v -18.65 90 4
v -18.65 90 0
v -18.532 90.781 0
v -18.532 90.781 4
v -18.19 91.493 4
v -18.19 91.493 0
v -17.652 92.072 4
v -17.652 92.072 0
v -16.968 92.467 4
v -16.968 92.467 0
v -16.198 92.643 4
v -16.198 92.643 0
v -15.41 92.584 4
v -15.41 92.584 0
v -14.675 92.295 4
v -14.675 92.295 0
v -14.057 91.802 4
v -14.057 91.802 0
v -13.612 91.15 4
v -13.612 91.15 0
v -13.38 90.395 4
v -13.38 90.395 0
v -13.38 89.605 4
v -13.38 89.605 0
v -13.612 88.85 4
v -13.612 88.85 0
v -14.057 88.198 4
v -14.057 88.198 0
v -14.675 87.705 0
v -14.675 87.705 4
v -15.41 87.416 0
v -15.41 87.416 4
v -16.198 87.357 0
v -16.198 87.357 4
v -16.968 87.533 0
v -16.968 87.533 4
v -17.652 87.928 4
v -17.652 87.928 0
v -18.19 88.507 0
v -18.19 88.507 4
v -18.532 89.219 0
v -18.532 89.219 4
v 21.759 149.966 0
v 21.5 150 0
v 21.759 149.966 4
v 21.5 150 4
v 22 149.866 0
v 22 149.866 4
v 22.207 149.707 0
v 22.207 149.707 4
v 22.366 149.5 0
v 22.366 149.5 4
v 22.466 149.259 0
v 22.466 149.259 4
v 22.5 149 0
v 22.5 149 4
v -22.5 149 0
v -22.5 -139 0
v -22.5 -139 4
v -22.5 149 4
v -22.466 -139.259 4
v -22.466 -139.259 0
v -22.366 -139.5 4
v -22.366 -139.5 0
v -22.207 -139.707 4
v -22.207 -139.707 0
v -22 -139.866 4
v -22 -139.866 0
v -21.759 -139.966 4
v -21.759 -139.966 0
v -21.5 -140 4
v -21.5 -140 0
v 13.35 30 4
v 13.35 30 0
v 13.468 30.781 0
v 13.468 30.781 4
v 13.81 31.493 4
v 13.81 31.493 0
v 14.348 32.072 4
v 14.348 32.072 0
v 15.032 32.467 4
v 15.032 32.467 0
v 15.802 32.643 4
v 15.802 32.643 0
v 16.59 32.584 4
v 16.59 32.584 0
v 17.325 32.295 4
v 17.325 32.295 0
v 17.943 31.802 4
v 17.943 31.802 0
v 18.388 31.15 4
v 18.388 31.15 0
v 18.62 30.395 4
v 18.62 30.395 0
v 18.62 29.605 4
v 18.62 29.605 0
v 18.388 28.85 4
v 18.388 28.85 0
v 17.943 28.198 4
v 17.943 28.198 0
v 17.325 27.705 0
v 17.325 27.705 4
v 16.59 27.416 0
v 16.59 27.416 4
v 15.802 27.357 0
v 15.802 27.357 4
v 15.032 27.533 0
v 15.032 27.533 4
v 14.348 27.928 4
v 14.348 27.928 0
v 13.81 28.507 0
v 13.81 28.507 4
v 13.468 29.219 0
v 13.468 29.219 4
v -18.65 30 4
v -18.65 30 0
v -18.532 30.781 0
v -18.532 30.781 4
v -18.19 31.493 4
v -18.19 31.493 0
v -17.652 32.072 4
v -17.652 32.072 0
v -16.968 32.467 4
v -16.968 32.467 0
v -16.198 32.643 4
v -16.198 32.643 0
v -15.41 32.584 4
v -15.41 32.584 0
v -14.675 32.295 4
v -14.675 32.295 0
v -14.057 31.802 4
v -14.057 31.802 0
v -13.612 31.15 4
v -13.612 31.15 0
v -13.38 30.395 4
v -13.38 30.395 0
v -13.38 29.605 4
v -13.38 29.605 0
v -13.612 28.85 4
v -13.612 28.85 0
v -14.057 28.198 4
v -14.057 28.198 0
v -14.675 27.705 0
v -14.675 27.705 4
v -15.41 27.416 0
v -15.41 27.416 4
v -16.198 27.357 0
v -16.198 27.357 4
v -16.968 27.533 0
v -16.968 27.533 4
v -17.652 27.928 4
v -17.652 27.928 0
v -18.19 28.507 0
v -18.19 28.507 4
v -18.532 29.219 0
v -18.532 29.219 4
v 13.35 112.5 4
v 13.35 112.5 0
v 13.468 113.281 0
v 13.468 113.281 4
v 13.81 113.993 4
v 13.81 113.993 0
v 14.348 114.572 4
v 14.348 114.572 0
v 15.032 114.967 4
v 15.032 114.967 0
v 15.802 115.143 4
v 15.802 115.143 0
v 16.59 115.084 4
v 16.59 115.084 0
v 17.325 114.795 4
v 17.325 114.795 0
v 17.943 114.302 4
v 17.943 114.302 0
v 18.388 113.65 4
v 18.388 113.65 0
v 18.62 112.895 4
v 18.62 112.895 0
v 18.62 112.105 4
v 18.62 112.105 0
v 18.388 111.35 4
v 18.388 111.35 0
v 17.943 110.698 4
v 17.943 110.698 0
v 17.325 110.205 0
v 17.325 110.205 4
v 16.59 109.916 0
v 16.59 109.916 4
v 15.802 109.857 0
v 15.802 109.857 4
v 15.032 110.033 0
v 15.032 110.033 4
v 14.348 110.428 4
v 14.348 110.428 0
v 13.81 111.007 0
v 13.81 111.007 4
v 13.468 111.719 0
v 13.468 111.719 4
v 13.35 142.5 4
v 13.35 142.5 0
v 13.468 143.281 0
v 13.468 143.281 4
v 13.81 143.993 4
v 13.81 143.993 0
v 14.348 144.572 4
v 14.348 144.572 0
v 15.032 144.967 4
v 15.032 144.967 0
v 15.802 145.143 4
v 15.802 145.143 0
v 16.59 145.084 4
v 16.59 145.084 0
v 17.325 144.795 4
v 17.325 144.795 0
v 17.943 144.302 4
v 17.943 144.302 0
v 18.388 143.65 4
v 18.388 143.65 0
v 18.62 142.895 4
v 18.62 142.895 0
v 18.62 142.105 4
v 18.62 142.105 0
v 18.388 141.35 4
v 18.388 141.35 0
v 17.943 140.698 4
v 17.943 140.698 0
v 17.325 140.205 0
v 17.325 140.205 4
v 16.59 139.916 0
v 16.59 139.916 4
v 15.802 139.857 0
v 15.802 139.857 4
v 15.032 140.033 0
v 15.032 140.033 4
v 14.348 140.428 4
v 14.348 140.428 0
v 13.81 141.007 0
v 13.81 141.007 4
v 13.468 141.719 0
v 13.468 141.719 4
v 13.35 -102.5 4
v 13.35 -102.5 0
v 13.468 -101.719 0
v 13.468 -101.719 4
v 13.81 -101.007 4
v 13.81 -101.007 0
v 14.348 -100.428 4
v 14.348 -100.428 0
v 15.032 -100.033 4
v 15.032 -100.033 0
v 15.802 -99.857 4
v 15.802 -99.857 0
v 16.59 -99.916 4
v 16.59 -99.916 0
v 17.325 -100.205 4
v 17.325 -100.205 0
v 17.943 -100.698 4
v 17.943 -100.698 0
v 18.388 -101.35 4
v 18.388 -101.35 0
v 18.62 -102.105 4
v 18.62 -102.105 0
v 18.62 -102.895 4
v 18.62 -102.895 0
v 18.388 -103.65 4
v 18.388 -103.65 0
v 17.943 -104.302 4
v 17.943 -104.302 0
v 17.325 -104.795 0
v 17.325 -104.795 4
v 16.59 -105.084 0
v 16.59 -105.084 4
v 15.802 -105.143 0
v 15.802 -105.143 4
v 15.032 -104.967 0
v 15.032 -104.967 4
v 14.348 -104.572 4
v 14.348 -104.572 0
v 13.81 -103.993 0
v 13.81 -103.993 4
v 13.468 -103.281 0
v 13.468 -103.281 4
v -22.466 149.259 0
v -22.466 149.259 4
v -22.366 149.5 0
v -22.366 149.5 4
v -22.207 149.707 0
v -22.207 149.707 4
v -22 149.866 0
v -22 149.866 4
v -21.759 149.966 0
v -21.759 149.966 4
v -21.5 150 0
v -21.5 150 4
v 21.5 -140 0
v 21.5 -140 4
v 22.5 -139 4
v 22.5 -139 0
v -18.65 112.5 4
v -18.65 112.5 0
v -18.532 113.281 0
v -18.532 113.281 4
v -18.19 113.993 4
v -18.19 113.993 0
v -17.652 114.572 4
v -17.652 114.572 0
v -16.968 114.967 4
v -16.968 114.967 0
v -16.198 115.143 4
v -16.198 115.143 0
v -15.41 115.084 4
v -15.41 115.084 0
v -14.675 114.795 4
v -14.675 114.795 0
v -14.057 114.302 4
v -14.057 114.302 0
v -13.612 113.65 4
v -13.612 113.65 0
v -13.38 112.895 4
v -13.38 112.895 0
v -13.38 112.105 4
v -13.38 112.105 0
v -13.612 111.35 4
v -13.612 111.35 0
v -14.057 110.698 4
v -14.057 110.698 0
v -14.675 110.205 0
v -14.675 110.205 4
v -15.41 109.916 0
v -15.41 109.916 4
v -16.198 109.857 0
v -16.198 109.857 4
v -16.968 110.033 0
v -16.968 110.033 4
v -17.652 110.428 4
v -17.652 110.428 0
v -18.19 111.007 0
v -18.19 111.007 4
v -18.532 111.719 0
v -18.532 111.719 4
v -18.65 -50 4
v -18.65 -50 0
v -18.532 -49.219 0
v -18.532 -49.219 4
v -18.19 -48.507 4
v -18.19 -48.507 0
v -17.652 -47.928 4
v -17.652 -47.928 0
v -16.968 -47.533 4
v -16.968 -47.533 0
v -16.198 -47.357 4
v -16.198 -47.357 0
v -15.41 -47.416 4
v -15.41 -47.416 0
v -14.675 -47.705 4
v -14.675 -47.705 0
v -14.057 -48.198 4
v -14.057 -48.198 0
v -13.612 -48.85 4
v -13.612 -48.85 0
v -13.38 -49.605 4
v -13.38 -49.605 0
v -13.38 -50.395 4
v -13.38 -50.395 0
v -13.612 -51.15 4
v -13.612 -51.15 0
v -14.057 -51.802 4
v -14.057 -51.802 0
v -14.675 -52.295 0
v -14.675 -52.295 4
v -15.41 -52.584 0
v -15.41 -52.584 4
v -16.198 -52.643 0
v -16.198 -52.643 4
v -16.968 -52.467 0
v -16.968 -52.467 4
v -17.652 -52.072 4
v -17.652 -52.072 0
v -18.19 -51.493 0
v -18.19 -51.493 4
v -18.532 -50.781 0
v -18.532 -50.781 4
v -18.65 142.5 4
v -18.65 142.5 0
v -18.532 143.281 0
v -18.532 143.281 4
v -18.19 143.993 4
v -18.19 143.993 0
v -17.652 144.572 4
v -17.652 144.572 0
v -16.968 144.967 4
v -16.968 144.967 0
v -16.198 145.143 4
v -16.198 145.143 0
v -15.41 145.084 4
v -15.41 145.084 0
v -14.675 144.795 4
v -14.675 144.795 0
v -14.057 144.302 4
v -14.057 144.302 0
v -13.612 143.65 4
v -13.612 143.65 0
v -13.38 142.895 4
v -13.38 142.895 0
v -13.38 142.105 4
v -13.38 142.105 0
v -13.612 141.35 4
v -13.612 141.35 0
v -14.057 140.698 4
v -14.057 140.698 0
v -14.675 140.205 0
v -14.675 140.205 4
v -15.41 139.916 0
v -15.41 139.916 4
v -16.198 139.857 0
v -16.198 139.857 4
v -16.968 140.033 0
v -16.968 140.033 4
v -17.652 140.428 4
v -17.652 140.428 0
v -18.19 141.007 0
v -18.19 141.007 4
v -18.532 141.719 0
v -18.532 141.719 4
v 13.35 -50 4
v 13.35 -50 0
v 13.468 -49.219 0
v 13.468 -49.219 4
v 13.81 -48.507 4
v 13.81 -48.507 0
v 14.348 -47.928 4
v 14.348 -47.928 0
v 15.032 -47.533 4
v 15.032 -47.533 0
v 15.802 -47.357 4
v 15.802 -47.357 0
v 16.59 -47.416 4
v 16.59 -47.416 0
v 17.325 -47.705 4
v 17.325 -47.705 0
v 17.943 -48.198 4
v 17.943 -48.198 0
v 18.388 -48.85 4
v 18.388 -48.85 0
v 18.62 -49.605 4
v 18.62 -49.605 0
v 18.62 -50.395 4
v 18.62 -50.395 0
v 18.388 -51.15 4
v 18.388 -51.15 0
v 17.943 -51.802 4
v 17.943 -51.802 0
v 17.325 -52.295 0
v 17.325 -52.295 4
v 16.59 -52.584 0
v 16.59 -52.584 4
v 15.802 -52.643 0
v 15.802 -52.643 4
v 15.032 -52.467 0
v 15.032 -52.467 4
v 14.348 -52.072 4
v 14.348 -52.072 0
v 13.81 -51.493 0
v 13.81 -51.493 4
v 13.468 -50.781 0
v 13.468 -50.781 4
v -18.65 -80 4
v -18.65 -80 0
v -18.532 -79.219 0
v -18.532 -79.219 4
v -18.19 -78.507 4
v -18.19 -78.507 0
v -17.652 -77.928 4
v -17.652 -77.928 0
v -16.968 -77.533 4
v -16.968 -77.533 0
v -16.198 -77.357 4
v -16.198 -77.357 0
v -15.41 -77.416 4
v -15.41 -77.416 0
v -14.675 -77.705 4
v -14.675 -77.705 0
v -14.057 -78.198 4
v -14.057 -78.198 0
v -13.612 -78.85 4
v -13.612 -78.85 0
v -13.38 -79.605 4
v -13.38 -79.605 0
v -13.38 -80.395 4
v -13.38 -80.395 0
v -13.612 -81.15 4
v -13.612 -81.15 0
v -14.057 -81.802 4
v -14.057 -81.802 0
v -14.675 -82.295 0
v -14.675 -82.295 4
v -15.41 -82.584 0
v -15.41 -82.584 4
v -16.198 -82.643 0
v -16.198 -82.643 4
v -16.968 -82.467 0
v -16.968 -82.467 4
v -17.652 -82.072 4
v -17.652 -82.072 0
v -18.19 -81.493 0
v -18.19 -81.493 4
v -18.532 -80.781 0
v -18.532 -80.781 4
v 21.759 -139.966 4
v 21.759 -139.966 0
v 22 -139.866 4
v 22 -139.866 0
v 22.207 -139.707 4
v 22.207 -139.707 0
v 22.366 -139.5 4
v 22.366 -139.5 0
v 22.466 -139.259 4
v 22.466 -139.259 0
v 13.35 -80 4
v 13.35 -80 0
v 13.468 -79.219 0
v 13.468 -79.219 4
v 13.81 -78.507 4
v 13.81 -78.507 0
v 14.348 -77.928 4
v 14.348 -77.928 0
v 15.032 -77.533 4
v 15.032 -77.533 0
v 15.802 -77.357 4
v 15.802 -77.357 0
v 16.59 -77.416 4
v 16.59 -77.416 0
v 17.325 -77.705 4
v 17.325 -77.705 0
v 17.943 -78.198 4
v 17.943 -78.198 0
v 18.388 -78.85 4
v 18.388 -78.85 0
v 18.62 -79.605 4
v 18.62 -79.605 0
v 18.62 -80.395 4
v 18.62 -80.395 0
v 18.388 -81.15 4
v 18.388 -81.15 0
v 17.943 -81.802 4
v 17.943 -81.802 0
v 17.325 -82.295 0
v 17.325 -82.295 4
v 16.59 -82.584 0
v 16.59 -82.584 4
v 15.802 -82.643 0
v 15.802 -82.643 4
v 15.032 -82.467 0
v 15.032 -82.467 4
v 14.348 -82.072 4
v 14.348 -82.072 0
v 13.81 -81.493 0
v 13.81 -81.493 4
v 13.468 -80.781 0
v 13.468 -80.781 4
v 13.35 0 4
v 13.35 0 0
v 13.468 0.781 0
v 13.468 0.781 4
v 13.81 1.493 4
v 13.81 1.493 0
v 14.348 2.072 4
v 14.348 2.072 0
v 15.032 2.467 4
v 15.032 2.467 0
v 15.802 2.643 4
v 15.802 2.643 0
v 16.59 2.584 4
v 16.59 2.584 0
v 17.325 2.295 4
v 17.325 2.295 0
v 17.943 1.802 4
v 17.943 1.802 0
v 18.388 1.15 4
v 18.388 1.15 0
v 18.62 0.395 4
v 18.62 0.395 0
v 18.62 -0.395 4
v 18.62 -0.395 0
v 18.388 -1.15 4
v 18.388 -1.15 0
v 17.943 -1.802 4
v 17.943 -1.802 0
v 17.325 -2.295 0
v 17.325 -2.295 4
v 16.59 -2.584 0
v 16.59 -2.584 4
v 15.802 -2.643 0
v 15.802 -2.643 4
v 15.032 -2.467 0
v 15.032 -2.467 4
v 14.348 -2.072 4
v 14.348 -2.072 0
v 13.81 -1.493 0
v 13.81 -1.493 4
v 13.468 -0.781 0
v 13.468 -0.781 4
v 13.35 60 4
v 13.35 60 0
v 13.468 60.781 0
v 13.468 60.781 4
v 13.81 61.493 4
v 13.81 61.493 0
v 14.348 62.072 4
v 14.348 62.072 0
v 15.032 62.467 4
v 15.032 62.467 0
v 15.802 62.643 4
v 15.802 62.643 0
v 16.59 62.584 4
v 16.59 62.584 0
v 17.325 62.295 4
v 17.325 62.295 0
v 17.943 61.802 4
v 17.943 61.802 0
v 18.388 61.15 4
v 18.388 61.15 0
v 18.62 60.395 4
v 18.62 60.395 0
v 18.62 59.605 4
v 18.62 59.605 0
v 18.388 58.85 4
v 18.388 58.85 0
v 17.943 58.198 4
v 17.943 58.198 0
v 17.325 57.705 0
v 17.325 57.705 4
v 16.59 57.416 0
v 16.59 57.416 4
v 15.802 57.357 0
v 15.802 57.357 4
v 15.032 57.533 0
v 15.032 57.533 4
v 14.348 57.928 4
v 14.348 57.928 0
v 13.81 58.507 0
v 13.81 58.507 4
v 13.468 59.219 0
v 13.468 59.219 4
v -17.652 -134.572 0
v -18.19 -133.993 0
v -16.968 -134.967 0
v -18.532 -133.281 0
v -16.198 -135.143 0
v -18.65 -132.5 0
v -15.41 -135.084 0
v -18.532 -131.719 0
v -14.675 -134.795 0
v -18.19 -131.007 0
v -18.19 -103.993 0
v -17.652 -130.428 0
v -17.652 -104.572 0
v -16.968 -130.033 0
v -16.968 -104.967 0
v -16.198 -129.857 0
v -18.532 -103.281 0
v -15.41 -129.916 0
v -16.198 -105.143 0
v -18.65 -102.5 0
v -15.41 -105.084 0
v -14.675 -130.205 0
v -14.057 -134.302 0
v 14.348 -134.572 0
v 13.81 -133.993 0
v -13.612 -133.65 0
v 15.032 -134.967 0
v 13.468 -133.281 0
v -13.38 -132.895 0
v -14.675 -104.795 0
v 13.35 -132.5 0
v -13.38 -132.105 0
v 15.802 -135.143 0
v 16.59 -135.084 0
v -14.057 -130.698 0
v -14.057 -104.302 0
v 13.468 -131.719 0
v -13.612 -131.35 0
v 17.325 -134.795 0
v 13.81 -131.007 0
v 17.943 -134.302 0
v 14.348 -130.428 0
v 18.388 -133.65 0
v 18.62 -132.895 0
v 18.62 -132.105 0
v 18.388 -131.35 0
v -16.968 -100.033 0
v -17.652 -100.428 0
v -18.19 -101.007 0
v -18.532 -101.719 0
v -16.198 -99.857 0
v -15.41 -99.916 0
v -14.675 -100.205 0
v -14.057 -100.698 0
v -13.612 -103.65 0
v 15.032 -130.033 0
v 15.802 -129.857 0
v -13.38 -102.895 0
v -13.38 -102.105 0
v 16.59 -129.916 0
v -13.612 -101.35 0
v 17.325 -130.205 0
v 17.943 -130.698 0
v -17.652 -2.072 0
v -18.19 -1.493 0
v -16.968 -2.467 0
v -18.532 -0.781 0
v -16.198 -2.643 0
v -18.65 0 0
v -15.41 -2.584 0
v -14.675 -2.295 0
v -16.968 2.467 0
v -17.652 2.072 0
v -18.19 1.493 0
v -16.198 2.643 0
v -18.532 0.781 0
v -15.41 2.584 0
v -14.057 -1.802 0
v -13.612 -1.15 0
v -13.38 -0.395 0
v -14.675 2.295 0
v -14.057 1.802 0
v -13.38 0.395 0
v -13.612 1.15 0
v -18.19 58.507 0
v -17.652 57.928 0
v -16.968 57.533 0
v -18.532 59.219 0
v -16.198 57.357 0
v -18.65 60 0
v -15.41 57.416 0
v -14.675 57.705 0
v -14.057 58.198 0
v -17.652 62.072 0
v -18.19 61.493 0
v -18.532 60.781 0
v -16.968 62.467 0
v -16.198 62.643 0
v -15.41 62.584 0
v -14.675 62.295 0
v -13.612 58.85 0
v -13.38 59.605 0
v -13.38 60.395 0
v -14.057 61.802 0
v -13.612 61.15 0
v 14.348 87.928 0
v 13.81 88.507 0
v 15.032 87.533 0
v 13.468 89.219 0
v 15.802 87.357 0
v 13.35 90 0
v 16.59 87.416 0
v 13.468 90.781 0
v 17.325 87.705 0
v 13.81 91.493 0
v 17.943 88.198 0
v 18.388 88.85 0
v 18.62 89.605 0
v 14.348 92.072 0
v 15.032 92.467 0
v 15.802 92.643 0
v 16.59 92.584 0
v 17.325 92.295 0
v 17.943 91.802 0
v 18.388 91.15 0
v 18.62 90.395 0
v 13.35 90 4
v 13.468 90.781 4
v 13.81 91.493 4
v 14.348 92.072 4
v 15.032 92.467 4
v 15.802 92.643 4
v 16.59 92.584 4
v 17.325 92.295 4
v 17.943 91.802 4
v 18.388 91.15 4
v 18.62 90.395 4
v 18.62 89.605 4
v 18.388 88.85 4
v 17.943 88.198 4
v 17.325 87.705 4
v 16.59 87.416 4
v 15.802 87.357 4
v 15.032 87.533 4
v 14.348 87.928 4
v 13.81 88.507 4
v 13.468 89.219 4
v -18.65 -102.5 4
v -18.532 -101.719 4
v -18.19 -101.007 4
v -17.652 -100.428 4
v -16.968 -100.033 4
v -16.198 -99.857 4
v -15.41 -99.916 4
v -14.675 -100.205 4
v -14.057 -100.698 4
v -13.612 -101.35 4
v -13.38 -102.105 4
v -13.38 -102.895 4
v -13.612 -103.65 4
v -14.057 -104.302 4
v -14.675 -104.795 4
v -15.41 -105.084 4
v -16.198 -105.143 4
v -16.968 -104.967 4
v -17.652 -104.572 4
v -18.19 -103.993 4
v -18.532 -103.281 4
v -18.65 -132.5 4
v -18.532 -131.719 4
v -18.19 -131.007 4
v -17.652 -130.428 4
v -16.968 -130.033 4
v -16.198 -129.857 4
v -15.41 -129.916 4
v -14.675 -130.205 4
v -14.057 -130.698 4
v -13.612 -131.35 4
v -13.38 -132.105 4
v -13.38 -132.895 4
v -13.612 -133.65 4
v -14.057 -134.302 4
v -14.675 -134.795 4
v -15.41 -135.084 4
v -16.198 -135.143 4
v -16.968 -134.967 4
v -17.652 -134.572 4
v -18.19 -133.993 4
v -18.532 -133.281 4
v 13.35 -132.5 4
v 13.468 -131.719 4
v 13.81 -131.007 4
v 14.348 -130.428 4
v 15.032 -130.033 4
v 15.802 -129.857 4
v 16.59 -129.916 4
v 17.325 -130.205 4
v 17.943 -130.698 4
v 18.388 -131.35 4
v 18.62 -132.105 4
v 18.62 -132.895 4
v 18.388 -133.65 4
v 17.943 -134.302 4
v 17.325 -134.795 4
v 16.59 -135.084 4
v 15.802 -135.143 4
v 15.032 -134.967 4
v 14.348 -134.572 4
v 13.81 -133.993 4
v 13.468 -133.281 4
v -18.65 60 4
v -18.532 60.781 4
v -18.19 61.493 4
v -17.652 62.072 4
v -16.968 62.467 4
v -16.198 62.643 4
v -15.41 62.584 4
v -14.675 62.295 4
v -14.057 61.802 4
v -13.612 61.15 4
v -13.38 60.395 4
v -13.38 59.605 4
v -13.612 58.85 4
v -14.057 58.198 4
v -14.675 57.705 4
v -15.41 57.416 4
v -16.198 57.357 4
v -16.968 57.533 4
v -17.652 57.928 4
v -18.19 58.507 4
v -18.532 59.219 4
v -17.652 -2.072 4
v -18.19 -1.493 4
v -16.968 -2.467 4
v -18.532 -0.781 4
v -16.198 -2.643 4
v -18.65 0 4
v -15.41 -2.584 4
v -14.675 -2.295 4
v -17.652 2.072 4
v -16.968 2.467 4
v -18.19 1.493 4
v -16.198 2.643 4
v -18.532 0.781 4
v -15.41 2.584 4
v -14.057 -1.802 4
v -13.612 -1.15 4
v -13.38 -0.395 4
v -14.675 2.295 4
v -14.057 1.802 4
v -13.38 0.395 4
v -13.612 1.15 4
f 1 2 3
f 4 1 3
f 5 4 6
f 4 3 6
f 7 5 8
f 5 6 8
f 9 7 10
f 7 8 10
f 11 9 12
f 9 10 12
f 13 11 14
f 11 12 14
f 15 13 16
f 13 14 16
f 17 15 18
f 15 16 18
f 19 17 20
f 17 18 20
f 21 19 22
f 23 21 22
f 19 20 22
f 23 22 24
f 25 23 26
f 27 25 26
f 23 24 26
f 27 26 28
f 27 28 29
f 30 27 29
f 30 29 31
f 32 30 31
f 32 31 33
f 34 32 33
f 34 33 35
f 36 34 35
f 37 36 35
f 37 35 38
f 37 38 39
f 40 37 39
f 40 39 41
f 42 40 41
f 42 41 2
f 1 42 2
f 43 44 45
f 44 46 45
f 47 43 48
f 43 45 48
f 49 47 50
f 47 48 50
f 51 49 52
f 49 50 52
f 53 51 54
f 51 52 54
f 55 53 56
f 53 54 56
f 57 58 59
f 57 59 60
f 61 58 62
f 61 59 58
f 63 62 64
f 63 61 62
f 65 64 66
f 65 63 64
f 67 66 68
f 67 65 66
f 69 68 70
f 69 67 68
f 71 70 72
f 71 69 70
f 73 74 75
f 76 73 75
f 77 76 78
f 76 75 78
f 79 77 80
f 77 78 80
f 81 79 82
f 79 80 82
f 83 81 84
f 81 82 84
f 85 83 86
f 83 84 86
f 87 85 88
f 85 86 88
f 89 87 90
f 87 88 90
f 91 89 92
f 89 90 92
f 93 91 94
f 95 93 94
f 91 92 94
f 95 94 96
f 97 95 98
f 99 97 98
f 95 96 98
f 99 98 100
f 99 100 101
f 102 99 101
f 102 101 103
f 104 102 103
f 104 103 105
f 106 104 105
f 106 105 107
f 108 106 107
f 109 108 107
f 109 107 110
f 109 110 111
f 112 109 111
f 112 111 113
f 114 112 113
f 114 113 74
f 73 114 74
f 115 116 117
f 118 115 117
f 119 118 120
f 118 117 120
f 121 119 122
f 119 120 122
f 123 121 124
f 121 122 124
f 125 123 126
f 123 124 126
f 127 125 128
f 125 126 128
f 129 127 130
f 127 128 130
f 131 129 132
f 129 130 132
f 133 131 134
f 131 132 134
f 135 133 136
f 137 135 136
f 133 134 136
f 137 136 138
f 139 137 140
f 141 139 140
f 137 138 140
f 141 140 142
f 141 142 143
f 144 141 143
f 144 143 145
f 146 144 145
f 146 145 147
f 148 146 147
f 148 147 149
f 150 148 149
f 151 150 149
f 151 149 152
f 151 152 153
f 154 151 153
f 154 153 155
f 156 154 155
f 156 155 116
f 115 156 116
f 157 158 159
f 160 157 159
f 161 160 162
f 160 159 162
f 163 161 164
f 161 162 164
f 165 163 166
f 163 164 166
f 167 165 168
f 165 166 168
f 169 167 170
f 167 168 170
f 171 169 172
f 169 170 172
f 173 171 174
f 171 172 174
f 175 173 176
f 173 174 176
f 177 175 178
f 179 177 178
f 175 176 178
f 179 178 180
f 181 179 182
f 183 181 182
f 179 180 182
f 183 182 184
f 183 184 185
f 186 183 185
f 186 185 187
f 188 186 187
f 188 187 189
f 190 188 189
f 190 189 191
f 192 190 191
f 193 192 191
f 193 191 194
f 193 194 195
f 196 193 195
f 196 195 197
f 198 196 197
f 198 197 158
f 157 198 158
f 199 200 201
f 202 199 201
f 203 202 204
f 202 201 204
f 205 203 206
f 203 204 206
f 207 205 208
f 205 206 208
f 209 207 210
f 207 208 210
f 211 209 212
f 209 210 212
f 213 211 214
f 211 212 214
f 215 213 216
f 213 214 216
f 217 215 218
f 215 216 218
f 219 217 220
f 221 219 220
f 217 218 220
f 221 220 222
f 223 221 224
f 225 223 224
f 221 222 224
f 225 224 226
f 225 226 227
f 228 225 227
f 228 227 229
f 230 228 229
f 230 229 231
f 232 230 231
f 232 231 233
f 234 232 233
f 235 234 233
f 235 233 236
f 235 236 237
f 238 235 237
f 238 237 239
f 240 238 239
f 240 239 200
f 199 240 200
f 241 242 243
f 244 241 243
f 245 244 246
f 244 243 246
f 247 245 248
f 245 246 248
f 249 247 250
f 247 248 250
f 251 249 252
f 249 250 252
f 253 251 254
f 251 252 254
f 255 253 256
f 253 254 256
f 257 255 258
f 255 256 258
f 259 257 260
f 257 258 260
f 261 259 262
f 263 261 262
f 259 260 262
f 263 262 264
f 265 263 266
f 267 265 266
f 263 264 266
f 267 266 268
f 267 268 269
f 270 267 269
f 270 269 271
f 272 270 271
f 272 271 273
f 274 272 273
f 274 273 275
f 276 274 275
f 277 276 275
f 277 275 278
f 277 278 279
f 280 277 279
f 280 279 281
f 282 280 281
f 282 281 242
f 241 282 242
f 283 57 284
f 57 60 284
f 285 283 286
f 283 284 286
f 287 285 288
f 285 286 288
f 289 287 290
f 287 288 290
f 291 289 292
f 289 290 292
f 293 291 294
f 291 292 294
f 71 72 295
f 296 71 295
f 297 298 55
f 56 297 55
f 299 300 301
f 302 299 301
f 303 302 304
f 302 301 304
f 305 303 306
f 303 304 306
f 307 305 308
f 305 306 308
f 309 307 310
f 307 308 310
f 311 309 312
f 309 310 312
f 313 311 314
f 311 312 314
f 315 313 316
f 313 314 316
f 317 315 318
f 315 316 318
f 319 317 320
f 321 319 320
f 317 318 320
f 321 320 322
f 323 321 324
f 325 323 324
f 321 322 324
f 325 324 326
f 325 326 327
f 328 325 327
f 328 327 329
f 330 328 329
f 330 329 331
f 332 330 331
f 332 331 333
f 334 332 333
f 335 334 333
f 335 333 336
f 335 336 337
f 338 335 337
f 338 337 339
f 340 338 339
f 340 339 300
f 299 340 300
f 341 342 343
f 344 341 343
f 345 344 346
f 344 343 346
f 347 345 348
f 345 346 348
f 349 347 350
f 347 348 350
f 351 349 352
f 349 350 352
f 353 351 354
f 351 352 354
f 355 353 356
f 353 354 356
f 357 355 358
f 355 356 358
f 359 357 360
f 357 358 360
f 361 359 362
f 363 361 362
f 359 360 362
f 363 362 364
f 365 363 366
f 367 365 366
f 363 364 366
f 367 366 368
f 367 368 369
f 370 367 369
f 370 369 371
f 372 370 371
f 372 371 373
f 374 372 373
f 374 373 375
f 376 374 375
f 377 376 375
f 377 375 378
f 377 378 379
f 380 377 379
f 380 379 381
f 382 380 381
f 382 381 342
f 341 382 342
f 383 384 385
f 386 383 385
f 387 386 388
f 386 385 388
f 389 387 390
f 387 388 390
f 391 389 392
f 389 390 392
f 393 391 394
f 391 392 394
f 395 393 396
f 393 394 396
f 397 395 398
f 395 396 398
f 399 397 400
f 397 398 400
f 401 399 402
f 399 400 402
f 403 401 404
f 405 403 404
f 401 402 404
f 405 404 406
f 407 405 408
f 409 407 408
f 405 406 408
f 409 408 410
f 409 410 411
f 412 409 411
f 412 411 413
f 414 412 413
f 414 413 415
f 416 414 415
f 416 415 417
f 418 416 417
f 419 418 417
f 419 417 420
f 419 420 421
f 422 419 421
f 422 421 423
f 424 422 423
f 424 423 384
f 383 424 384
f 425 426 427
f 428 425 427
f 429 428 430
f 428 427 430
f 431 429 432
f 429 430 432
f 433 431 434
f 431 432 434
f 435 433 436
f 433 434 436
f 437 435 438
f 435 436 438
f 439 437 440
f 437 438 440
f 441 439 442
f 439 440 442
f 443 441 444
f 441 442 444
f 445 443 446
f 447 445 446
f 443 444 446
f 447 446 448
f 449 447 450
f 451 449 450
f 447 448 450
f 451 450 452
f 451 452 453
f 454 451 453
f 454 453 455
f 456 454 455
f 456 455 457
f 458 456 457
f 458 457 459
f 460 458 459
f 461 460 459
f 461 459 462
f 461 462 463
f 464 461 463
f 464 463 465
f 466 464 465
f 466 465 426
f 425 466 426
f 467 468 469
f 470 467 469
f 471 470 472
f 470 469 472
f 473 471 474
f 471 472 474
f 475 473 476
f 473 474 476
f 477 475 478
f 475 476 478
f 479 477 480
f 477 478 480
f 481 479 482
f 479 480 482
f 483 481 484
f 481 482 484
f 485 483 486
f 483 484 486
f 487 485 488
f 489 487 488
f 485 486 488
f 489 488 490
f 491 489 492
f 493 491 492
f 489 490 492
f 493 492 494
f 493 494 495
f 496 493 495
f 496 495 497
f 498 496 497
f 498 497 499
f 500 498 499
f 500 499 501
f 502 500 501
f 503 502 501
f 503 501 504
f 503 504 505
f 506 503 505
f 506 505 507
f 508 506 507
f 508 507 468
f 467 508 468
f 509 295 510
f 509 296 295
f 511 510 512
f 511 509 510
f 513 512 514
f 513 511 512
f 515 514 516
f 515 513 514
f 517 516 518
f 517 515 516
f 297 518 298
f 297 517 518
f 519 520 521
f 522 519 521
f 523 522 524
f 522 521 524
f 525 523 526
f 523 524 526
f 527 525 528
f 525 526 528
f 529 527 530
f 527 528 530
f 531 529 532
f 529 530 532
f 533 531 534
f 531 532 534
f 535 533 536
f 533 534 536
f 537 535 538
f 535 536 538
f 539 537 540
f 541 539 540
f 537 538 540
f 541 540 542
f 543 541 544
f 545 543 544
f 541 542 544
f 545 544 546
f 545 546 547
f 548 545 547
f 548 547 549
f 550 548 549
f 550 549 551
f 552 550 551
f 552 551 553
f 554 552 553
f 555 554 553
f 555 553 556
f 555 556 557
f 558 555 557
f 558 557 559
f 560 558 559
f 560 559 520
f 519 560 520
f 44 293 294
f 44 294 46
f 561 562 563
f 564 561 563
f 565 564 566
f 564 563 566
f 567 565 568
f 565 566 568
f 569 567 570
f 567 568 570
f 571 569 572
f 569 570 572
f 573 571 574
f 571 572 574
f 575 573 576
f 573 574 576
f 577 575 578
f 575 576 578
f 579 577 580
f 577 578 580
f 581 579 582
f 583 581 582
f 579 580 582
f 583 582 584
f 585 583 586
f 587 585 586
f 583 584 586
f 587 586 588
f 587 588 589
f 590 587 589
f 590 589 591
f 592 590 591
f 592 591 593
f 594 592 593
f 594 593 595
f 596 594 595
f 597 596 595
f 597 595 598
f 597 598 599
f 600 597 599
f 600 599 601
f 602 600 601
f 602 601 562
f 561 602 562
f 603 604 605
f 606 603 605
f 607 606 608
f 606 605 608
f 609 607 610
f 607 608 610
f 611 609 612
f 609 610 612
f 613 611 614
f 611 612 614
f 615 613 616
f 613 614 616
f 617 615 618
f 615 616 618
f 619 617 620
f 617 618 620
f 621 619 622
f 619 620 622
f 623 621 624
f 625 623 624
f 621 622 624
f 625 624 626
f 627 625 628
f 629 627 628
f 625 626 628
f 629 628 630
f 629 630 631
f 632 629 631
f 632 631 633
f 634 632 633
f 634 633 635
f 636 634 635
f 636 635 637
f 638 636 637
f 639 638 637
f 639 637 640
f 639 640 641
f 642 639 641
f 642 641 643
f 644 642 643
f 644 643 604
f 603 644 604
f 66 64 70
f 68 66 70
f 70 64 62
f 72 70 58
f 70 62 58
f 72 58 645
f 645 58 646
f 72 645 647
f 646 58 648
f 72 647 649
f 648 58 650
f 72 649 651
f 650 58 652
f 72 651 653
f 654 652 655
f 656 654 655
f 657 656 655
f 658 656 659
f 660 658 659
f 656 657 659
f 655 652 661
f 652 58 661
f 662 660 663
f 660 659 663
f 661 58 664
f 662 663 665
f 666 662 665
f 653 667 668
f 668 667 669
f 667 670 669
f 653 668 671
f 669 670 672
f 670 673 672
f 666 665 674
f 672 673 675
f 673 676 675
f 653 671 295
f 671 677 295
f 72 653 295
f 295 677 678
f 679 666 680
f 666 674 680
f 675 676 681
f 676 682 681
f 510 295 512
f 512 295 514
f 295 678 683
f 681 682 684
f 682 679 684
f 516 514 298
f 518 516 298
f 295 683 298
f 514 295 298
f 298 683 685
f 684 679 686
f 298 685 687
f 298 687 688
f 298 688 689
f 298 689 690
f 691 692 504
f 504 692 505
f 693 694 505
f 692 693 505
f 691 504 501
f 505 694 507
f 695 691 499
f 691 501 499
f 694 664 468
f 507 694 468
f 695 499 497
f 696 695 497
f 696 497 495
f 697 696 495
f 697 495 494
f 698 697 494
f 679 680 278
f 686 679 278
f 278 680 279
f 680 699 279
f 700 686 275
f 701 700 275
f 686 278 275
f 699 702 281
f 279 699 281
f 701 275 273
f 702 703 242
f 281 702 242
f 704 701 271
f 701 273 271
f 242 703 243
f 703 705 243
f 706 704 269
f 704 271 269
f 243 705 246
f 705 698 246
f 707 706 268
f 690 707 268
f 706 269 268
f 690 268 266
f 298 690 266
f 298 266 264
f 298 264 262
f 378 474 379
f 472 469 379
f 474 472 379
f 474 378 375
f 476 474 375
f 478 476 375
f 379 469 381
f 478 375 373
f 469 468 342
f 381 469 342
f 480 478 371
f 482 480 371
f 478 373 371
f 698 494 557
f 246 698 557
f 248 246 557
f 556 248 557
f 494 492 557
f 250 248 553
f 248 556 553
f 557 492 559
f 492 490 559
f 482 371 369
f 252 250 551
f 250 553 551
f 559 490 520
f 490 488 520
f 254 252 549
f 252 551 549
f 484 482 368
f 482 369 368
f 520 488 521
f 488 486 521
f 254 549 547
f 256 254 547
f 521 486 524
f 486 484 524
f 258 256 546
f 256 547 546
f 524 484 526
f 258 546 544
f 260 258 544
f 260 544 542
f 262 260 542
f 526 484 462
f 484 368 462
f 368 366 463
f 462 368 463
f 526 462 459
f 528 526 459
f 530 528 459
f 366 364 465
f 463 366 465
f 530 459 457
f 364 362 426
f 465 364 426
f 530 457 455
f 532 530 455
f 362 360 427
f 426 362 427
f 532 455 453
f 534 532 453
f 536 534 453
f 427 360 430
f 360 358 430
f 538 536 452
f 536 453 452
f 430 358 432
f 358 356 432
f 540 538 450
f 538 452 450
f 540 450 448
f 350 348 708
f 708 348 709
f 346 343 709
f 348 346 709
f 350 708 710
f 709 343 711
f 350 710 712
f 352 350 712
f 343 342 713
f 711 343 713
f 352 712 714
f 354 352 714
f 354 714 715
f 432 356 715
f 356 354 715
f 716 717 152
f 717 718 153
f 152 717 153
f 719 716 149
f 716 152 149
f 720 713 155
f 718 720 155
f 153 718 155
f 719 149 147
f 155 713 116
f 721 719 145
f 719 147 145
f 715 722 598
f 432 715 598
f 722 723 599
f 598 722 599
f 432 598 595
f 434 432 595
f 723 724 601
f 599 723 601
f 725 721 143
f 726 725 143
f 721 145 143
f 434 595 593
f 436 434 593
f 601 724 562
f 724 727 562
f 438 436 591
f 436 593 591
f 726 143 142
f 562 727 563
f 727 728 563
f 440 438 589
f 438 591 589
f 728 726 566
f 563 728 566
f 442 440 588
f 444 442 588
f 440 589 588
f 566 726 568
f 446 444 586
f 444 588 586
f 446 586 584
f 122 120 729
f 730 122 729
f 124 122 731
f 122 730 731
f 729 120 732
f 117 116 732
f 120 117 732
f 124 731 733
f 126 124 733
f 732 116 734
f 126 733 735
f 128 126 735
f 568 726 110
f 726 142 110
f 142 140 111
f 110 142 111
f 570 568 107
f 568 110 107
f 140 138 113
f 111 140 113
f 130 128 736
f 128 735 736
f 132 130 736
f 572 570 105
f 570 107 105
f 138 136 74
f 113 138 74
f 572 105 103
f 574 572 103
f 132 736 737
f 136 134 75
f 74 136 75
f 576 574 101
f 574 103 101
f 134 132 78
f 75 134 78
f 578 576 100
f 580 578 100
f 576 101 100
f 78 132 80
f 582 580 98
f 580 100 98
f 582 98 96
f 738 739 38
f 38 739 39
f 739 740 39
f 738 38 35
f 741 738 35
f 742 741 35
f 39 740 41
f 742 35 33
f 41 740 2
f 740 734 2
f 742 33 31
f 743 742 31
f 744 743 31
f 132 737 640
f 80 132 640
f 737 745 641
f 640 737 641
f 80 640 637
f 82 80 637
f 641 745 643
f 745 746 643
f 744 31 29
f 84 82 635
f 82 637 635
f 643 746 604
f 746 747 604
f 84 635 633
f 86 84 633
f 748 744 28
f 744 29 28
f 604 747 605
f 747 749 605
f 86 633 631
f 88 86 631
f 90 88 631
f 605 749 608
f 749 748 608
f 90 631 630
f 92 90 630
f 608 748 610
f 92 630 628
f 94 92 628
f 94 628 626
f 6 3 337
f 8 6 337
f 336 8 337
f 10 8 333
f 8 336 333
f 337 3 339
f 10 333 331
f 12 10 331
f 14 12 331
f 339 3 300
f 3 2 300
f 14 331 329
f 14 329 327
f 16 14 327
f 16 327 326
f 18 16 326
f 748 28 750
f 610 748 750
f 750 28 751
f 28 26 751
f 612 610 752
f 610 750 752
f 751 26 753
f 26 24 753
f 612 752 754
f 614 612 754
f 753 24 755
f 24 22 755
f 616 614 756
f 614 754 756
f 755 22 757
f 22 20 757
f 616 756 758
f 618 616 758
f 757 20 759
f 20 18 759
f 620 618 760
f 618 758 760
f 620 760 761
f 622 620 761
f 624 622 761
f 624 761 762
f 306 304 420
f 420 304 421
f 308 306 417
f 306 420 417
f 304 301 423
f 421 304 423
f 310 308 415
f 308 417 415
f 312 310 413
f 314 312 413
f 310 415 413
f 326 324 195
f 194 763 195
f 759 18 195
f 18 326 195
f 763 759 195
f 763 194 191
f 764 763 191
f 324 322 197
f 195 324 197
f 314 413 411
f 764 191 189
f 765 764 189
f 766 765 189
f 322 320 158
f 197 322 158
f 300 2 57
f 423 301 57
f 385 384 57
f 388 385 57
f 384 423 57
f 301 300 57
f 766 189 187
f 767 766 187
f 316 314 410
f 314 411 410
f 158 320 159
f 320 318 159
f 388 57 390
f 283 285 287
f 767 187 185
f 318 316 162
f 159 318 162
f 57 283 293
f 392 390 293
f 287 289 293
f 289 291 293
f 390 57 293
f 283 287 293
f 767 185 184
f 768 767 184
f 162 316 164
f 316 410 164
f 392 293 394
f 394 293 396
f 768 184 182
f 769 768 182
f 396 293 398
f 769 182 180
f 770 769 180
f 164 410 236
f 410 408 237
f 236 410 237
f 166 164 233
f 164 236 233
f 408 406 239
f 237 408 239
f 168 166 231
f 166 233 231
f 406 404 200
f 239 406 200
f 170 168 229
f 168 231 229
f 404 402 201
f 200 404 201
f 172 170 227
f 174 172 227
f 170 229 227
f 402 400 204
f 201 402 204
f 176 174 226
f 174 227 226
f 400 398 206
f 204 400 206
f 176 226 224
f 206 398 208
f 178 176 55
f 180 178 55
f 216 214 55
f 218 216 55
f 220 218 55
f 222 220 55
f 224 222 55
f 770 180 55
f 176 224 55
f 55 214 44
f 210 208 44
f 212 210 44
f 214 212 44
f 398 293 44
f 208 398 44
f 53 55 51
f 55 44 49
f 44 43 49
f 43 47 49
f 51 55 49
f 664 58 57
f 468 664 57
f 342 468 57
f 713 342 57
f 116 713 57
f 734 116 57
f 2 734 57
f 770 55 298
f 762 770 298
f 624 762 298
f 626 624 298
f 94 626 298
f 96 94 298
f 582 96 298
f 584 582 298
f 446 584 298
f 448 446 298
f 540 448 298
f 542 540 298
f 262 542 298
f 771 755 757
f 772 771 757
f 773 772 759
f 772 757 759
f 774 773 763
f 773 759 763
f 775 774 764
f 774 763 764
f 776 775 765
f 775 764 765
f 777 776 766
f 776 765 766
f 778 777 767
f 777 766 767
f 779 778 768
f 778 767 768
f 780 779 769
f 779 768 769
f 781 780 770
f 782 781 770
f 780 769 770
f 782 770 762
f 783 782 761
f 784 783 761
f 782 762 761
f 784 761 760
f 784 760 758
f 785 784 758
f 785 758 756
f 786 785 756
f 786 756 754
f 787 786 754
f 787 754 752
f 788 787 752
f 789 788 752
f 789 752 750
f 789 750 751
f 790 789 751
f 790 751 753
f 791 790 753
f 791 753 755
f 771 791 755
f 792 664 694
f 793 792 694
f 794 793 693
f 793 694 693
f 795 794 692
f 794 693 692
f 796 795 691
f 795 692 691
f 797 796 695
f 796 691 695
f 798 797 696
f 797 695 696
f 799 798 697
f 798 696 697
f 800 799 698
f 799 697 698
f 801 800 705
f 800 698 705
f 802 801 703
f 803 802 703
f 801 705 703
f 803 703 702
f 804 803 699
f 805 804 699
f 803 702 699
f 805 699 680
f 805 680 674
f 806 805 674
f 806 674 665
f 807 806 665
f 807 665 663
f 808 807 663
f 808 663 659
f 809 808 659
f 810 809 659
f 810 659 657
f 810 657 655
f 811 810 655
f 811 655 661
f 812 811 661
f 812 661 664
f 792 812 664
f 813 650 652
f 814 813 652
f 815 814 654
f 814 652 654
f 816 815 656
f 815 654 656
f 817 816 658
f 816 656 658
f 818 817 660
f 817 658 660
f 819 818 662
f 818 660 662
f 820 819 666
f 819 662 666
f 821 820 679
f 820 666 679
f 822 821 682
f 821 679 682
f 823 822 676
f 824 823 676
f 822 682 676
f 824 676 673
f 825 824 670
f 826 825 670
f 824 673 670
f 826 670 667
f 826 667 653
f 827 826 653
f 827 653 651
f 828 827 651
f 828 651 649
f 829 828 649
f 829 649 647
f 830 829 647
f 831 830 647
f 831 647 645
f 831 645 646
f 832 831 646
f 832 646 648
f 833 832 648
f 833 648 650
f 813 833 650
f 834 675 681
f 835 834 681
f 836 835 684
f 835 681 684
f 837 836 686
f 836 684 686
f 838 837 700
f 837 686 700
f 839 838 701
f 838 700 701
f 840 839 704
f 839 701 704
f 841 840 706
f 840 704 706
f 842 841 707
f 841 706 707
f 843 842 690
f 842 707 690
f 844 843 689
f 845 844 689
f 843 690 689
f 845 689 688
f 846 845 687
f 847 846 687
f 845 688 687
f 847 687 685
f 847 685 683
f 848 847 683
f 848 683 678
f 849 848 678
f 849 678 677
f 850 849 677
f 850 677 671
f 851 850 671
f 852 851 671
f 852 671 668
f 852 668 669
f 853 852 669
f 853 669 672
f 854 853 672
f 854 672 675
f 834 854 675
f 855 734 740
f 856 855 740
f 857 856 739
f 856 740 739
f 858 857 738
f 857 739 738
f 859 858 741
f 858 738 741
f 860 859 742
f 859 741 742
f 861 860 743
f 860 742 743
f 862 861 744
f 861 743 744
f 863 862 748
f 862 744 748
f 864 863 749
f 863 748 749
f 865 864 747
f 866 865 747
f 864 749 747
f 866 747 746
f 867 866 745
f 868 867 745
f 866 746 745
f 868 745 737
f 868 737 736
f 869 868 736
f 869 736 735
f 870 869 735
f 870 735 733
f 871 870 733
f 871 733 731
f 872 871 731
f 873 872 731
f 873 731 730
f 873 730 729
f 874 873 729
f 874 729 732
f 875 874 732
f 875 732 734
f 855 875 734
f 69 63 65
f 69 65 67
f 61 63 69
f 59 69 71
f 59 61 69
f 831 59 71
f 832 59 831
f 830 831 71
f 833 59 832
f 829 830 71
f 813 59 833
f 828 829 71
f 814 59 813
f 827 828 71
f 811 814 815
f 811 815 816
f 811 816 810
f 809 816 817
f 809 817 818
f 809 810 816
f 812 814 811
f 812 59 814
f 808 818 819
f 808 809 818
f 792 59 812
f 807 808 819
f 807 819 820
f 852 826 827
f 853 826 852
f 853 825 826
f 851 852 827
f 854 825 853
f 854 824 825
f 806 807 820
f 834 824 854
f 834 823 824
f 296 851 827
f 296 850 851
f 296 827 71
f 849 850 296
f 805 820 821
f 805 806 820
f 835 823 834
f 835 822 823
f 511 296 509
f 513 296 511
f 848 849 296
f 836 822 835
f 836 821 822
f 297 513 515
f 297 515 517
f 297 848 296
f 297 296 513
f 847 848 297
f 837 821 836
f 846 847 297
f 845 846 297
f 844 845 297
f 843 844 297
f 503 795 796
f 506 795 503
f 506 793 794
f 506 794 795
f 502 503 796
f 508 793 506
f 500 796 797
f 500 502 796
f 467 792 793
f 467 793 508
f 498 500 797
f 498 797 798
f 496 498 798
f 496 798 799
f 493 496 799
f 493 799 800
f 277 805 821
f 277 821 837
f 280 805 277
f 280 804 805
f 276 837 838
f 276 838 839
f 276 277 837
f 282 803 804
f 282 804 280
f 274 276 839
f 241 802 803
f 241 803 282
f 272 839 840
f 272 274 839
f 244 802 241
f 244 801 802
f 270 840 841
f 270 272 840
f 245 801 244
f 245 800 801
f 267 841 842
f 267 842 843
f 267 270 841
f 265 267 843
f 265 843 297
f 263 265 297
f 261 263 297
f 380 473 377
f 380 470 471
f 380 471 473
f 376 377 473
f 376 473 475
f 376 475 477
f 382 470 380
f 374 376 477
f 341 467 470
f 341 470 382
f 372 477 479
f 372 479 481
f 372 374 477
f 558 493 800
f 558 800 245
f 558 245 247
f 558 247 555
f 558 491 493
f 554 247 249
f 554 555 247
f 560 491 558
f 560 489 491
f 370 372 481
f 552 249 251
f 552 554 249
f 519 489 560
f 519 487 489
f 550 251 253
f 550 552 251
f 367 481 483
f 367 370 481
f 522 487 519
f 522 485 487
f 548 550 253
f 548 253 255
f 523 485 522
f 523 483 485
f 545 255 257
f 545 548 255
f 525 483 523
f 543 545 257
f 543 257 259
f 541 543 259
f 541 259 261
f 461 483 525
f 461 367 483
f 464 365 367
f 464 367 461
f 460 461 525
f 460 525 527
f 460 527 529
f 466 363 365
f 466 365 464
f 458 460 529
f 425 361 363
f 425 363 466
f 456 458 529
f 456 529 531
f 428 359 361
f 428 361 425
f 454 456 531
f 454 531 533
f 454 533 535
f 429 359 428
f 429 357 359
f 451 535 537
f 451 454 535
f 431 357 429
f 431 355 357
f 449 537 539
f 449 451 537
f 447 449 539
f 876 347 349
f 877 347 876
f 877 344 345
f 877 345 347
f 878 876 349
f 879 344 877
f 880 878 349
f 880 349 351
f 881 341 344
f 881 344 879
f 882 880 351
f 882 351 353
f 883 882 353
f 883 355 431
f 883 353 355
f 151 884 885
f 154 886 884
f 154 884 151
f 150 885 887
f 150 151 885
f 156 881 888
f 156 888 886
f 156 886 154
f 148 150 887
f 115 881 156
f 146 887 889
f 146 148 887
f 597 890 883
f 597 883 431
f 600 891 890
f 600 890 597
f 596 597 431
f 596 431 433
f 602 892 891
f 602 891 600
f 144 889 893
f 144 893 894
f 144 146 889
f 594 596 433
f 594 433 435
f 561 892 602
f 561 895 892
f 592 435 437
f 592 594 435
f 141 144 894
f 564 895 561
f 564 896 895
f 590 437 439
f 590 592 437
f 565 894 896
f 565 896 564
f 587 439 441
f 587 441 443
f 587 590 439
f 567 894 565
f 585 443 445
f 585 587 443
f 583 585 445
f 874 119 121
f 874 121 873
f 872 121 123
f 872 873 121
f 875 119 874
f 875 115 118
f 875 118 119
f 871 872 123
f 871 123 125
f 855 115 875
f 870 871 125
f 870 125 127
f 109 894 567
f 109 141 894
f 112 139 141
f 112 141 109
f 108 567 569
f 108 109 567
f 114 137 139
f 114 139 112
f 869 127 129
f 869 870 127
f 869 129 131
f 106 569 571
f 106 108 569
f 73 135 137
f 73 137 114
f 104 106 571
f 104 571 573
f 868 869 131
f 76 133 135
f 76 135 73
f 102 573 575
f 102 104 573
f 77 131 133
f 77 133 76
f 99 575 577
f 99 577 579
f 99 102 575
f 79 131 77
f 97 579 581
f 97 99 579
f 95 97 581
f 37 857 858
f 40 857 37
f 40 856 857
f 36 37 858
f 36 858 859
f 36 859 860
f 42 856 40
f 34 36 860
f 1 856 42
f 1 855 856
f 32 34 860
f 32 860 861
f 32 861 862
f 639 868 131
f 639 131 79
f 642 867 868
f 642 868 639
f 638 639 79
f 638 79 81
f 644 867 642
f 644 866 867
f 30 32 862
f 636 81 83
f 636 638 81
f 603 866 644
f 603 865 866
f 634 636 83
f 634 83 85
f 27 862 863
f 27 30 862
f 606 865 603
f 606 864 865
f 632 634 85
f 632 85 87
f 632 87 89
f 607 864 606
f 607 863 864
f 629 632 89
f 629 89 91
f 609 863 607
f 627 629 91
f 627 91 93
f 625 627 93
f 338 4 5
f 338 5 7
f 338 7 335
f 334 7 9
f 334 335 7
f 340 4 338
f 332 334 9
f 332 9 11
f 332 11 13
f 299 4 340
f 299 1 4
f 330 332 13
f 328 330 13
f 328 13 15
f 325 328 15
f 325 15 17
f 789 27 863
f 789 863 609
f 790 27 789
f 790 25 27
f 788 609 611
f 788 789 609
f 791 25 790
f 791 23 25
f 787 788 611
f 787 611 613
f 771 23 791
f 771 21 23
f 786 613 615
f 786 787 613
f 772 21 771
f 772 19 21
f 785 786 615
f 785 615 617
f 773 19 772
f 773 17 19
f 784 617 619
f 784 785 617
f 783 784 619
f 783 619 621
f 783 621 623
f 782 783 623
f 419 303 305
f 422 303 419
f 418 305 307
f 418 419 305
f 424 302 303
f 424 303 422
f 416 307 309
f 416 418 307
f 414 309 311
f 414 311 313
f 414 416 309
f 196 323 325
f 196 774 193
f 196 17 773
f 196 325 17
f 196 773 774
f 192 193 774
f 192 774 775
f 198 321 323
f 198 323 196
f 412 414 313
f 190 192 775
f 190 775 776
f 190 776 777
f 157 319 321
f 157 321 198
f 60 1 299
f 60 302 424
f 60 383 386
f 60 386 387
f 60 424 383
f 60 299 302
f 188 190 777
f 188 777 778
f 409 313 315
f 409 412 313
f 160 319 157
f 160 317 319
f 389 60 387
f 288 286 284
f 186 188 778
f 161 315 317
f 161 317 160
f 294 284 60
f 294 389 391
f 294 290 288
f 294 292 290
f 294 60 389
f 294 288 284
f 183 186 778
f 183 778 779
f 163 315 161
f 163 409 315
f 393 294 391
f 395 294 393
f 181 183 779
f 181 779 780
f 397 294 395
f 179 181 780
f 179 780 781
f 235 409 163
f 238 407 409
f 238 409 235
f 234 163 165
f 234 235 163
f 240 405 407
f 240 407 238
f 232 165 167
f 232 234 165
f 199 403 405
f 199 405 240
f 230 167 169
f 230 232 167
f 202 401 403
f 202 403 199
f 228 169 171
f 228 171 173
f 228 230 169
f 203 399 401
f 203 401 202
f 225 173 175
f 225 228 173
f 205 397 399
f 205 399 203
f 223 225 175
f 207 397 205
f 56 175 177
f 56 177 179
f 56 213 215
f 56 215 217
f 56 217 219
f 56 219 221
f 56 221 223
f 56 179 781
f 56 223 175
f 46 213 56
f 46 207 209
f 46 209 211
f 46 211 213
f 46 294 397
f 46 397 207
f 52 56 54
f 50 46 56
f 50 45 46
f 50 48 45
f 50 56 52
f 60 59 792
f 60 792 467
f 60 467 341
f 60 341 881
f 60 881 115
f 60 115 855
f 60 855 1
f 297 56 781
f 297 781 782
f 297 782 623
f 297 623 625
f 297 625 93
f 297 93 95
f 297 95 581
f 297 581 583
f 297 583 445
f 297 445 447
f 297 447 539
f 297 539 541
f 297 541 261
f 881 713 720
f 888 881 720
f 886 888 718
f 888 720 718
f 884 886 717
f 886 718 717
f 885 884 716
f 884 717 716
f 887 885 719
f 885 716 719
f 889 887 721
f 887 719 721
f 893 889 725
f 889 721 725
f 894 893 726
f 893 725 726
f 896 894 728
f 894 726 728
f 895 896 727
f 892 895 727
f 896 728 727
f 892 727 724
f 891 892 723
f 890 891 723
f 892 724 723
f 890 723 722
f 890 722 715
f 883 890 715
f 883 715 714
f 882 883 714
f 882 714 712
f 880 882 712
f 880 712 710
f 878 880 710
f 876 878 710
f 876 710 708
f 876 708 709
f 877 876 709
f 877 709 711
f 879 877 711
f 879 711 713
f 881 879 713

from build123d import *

# Parameters (mm, degrees)
SKETCH1_W            = 45
SKETCH1_H            = 290
BOSS_EXTRUDE1_DEPTH  = 4
M5_CLEARANCE_HOLE1_D = 5.3
FILLET1_R            = 1


with BuildPart() as part:
    # Sketch1 → Boss-Extrude1 (new body)
    with BuildSketch(Plane.XY):
        with Locations((0, 5)):
            Rectangle(SKETCH1_W, SKETCH1_H)
    extrude(amount=BOSS_EXTRUDE1_DEPTH)

    # M5 Clearance Hole1 (through all)
    with Locations(Plane.XY.offset(4)):
        with Locations((-16, 142.5), (-16, 112.5), (-16, -102.5), (-16, -132.5), (16, -132.5), (16, -102.5), (16, 112.5), (16, 142.5), (-16, 30), (-16, 0), (16, 0), (16, 30), (-16, 90), (-16, 60), (-16, -50), (-16, -80), (16, -80), (16, -50), (16, 60), (16, 90)):
            Hole(M5_CLEARANCE_HOLE1_D / 2)

    # Fillet1
    fillet1_edges = [part.edges().sort_by_distance(p)[0] for p in [
        (-22.5, 150, 2),
        (22.5, 150, 2),
        (22.5, -140, 2),
        (-22.5, -140, 2),
    ]]
    fillet(fillet1_edges, radius=FILLET1_R)


solid = part.part
